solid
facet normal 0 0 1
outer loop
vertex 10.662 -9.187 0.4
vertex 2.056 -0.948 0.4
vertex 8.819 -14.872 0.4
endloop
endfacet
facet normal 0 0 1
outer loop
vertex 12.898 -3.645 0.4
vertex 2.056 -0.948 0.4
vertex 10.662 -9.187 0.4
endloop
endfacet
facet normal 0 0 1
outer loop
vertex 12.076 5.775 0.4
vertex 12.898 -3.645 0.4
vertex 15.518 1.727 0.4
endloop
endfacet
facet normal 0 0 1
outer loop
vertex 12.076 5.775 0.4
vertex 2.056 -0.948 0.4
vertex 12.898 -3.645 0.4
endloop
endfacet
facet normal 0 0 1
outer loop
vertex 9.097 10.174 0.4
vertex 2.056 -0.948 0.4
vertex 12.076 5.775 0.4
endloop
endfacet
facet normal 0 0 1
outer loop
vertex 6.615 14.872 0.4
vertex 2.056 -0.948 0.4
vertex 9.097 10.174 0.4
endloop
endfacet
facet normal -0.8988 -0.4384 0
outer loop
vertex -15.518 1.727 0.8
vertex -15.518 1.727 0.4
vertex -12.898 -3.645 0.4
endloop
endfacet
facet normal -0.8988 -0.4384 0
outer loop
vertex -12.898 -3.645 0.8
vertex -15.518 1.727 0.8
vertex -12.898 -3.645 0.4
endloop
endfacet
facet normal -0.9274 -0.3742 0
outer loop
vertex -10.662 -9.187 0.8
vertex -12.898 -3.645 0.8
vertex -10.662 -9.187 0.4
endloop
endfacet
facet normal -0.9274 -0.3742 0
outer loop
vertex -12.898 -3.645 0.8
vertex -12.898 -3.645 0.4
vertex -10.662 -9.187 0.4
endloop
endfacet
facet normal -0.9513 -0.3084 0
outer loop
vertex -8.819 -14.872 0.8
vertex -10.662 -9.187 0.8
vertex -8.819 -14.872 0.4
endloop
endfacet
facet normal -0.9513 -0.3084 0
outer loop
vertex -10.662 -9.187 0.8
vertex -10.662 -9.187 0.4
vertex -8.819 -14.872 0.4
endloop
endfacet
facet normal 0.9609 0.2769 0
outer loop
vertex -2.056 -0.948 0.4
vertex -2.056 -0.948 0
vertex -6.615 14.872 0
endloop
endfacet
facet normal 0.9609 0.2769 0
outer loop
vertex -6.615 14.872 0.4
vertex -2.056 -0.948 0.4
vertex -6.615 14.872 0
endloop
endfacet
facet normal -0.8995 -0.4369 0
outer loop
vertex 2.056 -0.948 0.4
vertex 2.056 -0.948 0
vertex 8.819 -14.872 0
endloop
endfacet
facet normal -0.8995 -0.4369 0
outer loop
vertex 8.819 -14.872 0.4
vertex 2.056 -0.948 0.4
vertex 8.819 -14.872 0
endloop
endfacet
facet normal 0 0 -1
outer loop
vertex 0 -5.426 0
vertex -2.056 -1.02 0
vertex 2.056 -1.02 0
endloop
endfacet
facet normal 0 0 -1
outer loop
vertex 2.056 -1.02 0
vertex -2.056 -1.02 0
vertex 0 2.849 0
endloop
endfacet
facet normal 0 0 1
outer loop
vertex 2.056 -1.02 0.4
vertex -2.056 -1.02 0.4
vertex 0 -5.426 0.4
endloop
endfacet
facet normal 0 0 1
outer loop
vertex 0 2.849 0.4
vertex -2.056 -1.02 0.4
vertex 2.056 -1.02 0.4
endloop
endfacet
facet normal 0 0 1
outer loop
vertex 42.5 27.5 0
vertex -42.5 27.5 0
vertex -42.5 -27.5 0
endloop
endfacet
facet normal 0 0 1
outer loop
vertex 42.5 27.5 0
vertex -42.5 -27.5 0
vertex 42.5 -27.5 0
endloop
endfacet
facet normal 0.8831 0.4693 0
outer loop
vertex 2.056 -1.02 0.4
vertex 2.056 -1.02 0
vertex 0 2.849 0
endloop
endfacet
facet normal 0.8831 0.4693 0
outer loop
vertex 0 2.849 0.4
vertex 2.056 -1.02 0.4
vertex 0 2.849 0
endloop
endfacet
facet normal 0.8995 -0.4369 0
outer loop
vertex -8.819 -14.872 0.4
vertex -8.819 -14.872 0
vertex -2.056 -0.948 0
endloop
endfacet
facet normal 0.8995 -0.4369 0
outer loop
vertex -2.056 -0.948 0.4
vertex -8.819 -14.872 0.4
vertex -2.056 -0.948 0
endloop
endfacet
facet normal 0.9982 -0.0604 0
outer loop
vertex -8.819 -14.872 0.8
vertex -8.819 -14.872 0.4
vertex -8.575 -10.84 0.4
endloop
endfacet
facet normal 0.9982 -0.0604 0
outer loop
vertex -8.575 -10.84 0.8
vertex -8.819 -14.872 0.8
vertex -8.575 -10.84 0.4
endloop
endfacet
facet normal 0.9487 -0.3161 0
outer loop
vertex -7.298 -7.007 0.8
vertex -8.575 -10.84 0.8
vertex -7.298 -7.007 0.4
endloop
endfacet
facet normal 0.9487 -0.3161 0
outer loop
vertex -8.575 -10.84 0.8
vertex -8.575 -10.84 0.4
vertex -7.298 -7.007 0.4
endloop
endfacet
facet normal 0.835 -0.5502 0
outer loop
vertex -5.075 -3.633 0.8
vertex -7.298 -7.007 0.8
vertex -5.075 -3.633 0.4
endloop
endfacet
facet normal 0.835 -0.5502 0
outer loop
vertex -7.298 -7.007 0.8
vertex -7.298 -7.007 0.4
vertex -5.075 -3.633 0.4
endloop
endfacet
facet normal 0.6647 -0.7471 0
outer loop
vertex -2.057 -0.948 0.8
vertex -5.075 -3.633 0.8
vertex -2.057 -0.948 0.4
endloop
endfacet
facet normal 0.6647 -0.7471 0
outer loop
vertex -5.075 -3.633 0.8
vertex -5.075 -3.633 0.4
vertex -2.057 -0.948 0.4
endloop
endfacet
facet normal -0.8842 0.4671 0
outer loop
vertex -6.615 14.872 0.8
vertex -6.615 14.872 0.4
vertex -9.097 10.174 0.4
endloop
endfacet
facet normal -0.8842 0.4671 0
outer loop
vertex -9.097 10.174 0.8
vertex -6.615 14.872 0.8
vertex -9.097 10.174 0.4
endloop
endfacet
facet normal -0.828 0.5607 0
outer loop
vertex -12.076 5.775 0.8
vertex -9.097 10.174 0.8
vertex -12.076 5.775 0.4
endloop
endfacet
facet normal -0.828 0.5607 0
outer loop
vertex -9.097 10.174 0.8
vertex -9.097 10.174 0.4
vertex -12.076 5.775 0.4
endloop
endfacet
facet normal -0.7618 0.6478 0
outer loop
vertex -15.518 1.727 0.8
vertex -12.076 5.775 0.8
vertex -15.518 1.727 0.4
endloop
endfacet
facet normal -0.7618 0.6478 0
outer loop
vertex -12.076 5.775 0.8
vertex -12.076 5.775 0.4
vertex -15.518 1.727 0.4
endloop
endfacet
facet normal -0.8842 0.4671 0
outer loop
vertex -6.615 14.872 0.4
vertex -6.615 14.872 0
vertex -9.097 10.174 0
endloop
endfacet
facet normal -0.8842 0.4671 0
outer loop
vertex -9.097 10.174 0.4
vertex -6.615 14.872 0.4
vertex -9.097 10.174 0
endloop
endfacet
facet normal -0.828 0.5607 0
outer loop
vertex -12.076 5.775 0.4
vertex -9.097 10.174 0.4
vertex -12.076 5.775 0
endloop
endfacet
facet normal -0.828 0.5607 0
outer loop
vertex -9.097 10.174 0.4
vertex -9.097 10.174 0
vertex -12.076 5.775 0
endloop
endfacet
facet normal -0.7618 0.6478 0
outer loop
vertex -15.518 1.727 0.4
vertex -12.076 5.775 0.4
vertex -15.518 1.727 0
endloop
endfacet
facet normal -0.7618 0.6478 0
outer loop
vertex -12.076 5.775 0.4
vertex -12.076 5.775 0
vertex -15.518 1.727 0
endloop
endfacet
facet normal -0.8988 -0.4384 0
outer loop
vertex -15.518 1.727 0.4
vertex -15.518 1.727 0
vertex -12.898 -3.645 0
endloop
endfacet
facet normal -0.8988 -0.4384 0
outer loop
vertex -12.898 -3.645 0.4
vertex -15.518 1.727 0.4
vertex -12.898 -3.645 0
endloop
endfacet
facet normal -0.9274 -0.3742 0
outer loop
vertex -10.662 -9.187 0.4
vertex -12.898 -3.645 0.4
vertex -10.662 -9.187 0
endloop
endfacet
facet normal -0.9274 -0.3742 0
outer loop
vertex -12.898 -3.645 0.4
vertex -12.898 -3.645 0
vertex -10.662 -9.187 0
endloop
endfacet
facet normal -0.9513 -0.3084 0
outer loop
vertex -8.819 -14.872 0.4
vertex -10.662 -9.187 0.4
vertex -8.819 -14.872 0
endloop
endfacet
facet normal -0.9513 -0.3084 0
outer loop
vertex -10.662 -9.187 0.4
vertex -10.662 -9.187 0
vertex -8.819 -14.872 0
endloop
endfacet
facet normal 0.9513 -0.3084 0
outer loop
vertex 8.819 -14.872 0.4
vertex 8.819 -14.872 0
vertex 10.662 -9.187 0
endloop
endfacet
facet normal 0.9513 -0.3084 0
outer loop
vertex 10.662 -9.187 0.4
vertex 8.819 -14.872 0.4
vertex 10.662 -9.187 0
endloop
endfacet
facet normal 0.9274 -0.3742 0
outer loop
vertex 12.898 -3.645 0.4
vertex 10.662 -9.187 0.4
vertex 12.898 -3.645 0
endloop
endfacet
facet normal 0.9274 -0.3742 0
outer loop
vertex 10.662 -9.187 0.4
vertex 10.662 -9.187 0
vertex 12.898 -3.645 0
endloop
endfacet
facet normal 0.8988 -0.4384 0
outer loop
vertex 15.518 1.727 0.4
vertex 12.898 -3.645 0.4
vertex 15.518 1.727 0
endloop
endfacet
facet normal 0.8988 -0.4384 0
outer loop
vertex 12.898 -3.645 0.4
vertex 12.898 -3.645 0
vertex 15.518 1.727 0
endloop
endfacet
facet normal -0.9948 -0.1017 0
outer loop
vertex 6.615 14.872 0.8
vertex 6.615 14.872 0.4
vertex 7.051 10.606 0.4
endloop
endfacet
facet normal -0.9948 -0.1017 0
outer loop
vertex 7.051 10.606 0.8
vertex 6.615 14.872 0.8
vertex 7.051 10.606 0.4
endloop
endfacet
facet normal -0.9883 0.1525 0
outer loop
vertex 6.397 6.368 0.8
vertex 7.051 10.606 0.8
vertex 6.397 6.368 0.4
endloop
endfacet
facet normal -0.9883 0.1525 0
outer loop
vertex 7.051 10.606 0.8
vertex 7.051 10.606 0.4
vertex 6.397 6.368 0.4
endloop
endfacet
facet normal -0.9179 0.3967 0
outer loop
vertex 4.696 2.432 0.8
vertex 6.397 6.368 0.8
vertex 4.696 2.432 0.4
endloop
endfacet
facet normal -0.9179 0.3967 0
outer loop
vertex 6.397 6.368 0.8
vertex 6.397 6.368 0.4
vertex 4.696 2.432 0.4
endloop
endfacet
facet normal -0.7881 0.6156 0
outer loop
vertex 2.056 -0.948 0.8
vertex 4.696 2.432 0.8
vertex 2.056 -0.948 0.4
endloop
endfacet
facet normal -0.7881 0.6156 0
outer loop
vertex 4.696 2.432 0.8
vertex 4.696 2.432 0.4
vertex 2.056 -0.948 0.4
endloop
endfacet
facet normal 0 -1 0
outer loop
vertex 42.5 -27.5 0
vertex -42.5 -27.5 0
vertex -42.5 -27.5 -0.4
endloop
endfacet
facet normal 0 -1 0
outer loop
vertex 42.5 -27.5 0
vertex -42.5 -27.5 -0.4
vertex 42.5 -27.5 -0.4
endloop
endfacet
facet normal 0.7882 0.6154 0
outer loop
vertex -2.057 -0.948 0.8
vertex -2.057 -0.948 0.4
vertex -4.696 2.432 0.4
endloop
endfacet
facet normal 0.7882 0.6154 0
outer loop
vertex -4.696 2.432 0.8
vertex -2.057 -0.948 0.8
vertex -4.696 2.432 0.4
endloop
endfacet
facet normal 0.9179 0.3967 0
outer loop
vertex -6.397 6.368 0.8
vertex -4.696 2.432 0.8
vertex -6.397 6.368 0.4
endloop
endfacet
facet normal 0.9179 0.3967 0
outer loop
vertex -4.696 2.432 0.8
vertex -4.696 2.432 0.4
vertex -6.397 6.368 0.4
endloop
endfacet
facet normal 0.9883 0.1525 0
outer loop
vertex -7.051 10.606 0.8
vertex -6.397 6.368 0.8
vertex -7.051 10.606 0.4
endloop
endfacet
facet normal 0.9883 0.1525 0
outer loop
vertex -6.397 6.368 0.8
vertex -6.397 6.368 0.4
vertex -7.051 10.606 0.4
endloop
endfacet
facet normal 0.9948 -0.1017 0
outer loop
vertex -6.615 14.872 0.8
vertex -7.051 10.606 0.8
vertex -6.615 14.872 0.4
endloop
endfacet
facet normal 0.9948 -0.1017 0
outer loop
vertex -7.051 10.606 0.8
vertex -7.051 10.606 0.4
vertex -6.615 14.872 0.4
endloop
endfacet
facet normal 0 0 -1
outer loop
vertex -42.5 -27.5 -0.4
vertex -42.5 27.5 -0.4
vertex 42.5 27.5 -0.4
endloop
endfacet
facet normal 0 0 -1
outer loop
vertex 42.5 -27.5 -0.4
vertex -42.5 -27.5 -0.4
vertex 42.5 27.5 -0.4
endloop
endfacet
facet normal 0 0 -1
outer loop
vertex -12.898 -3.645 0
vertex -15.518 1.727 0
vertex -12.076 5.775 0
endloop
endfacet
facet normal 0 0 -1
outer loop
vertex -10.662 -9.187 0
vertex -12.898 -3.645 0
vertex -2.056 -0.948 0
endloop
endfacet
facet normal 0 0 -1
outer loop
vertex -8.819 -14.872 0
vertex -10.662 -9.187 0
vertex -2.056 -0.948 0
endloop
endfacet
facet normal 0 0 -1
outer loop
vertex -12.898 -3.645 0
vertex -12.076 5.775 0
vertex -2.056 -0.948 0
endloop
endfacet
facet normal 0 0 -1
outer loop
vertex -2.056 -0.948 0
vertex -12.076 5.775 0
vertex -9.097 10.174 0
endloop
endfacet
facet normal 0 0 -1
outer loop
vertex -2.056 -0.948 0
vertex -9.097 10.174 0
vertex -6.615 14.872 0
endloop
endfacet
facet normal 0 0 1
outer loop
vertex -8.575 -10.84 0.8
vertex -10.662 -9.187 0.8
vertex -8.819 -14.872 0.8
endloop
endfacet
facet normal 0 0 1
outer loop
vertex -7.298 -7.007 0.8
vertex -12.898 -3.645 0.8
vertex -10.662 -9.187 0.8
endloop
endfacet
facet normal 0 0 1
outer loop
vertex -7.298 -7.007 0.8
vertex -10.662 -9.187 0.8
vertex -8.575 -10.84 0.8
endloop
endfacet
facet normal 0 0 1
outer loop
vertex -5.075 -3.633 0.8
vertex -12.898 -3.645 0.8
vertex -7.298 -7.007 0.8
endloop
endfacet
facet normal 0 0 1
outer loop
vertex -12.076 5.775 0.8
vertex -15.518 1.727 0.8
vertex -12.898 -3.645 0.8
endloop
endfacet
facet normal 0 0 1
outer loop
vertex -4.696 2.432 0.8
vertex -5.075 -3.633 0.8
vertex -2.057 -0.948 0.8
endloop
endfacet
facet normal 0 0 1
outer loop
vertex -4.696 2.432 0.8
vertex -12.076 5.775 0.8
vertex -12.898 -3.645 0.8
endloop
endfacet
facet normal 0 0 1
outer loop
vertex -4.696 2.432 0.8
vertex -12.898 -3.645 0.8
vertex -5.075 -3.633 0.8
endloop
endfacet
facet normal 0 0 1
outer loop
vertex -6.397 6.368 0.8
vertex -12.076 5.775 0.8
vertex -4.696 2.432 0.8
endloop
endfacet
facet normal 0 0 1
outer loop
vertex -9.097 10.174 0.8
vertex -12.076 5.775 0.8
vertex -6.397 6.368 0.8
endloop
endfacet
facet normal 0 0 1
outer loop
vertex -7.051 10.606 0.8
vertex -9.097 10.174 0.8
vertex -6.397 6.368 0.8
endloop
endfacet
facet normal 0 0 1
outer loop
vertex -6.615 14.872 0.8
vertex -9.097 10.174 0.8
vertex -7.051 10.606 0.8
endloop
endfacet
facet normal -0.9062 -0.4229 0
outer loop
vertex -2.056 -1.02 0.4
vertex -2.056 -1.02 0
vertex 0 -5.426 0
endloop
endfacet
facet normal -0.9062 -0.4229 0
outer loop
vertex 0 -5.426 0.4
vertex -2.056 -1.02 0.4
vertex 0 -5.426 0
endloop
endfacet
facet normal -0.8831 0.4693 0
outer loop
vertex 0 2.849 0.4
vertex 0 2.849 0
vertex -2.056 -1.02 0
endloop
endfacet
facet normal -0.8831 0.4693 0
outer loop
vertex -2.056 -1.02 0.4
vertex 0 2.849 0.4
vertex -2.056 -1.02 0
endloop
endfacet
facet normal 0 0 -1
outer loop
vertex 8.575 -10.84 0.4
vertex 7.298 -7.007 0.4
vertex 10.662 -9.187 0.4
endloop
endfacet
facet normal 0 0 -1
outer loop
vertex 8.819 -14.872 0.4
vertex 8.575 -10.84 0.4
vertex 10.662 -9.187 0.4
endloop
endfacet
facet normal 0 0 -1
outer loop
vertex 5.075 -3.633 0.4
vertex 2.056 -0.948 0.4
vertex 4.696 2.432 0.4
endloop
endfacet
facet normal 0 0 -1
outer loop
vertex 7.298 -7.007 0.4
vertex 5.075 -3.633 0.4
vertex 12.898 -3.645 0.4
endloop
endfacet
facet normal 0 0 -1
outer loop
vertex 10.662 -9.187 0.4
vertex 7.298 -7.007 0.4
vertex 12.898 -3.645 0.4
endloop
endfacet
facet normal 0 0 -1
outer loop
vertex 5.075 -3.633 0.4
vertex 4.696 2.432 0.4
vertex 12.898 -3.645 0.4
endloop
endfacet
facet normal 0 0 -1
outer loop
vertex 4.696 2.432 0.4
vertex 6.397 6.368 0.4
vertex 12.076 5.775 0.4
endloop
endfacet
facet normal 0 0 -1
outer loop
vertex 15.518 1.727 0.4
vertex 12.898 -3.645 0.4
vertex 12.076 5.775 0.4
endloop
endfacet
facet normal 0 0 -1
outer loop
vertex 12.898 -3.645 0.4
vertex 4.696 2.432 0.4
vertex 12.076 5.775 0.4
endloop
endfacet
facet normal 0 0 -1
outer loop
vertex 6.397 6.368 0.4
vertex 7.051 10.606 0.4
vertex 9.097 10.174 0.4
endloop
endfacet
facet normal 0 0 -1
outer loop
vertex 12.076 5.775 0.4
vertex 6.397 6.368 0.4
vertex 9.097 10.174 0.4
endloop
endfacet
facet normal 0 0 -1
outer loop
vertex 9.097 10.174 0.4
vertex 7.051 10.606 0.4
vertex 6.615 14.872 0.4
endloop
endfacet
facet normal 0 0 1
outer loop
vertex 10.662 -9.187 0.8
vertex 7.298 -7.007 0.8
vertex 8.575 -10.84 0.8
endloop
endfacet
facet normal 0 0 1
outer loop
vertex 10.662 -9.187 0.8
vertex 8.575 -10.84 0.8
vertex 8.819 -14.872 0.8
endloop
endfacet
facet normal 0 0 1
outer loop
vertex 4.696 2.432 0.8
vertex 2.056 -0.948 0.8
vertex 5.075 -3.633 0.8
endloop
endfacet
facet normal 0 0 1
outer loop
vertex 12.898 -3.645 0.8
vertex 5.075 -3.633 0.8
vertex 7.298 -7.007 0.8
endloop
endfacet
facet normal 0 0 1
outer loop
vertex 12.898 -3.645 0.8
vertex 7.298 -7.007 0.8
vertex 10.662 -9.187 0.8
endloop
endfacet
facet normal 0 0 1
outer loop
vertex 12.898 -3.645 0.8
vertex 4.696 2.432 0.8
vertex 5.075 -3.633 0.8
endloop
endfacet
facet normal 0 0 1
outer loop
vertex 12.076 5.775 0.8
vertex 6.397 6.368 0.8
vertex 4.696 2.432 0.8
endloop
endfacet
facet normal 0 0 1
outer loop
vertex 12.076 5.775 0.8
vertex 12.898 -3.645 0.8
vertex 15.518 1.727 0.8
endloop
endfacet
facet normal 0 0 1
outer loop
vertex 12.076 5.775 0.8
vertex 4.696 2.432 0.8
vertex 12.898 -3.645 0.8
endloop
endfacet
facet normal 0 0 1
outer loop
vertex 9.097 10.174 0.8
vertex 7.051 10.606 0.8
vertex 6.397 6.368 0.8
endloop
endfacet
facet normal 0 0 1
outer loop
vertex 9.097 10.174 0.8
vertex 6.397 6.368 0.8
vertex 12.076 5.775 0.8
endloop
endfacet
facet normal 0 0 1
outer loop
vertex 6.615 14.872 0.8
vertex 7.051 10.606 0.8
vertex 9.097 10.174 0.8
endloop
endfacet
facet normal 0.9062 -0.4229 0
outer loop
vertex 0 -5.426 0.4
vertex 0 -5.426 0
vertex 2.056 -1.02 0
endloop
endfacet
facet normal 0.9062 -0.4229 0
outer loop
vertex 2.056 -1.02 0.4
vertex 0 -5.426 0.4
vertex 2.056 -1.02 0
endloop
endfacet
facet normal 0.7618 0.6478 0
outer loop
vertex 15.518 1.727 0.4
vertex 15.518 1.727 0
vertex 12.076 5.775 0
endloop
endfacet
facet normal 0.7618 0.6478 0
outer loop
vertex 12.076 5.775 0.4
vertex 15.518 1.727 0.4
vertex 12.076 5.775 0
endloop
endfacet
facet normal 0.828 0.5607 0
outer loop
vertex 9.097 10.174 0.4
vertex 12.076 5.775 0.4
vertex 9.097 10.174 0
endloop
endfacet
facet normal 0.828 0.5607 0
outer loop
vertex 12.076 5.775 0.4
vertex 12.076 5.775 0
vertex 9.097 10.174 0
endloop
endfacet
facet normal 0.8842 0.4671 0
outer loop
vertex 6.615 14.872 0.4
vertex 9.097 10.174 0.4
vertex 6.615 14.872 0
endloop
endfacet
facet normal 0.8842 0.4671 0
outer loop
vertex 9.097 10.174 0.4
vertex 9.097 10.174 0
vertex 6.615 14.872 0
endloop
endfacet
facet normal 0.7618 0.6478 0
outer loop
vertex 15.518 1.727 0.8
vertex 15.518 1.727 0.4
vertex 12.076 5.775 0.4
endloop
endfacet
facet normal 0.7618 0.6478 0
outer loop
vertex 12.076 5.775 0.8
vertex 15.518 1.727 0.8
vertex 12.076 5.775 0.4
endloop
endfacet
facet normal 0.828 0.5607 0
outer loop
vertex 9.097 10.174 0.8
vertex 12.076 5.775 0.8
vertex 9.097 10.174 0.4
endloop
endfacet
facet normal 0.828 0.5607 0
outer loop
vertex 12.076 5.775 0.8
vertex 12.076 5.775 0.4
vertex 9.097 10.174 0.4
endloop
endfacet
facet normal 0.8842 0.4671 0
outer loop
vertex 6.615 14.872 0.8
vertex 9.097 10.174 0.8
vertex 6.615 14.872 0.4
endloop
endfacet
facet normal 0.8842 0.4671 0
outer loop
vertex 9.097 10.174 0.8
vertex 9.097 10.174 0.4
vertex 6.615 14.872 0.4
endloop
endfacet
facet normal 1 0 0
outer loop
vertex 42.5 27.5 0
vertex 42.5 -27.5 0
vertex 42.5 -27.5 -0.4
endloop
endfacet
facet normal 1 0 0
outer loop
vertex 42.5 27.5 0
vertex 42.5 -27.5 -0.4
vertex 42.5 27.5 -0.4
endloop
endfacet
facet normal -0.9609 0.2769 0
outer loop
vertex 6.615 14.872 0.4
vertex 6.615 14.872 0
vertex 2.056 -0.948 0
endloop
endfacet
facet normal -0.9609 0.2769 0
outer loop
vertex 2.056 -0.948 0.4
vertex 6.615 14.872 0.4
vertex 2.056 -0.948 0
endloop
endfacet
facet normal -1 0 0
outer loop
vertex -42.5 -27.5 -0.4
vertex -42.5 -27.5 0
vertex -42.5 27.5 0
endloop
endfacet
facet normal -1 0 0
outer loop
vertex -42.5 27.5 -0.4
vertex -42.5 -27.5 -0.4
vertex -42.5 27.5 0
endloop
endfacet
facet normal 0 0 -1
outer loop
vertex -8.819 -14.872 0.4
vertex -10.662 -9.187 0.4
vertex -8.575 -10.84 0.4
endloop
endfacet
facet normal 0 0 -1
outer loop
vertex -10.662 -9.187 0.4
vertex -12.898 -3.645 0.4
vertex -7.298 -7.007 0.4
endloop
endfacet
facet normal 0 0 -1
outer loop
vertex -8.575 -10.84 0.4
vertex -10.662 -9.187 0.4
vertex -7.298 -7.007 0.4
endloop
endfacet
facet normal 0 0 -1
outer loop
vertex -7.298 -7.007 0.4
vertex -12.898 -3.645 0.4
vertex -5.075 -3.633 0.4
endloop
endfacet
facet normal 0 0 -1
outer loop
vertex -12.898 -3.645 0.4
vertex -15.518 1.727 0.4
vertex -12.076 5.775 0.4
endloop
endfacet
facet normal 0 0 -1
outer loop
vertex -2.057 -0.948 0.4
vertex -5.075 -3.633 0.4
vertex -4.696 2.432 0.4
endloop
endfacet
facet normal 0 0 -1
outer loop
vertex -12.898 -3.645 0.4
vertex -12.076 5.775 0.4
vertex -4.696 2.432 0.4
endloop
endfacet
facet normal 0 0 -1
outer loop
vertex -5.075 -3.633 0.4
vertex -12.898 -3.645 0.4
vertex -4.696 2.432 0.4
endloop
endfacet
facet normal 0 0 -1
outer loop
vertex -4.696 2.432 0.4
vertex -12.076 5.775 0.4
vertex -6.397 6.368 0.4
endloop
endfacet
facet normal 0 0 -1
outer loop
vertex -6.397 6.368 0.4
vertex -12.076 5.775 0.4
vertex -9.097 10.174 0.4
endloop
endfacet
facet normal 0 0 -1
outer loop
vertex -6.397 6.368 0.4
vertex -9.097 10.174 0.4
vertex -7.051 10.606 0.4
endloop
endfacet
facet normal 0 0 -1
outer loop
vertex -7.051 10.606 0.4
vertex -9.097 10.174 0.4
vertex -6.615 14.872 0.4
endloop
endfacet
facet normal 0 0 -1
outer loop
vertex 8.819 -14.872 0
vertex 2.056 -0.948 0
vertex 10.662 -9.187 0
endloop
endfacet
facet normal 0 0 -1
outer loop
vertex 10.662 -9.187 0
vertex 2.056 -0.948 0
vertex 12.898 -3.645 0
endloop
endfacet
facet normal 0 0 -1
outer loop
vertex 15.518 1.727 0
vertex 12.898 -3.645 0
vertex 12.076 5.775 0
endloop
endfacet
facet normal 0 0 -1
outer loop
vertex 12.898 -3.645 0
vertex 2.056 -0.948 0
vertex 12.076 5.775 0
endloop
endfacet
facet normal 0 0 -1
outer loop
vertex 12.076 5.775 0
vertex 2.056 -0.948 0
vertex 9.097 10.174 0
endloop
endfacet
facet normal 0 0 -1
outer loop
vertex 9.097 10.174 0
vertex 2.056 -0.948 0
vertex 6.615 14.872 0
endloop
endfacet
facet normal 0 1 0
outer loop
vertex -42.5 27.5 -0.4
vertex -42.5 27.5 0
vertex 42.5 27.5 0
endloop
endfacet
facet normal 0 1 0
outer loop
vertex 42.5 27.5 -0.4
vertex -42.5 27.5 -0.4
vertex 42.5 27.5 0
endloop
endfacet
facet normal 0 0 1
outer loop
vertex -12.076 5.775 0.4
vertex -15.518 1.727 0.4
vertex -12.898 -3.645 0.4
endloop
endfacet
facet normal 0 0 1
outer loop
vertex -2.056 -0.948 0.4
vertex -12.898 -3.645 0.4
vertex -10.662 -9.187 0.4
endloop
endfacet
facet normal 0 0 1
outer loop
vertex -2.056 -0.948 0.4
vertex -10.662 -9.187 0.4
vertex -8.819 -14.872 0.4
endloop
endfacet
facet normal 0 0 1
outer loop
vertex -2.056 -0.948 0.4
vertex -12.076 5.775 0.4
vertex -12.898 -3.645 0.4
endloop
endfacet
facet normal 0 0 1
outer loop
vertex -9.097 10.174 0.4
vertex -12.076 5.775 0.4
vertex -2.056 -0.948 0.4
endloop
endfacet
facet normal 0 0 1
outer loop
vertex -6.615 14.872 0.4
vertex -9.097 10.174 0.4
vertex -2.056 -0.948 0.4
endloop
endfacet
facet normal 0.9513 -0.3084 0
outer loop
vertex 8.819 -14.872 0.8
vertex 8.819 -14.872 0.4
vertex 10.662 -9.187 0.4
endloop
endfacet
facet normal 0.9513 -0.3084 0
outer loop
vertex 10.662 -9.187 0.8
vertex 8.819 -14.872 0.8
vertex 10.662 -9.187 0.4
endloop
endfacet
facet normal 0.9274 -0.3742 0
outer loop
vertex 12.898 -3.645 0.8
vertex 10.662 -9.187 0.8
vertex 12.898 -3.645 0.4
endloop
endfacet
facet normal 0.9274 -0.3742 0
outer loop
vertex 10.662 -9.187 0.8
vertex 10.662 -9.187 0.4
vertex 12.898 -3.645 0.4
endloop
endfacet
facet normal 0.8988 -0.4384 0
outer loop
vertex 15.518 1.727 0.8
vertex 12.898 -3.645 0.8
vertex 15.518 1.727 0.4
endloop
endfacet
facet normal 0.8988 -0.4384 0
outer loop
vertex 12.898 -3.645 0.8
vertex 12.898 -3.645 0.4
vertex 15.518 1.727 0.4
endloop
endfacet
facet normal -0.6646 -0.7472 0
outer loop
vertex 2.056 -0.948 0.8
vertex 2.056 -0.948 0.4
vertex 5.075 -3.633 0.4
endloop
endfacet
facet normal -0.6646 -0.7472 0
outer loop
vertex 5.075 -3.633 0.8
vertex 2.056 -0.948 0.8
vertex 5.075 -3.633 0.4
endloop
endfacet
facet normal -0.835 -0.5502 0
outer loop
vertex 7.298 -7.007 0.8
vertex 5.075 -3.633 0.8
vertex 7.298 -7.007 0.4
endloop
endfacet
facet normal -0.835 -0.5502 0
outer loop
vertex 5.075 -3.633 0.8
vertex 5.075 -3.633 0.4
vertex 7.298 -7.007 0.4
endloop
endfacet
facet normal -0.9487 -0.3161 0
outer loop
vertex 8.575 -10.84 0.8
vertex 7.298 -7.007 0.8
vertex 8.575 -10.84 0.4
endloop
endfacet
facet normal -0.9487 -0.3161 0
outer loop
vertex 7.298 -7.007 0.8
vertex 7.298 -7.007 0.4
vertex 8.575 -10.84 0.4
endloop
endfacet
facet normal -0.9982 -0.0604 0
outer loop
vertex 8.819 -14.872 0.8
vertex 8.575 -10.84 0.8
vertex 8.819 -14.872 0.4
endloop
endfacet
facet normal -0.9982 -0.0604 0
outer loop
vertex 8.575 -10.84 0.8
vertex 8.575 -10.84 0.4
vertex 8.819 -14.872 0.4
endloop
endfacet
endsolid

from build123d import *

# Parameters (mm, degrees)
F1_DEPTH = 0.4
F2_W     = 85
F2_H     = 55
F3_DEPTH = 0.4
F5_DEPTH = 0.4


with BuildPart() as f1:
    # F0 (on Top) → F1 (new body)
    with BuildSketch(Plane.XY):
        Polygon((-2.0565, -1.019582), (0, -5.426367), (2.0565, -1.019582), (0, 2.848596), align=None)
        with BuildLine():
            ThreePointArc((15.517817, 1.726592), (10.526359, 7.933479), (6.615495, 14.872156))
            Line((6.615495, 14.872156), (2.0565, -0.948094))
            Line((2.0565, -0.948094), (8.818777, -14.872156))
            ThreePointArc((8.818777, -14.872156), (11.731548, -6.396516), (15.517817, 1.726592))
        make_face()
        with BuildLine():
            Line((-2.0565, -0.948094), (-6.615495, 14.872156))
            ThreePointArc((-6.615495, 14.872156), (-10.526359, 7.933479), (-15.517817, 1.726592))
            ThreePointArc((-15.517817, 1.726592), (-11.731548, -6.396516), (-8.818777, -14.872156))
            Line((-8.818777, -14.872156), (-2.0565, -0.948094))
        make_face()
    extrude(amount=F1_DEPTH)


with BuildPart() as f3:
    # F2 (on Top) → F3 (new body)
    with BuildSketch(Plane.XY):
        Rectangle(F2_W, F2_H)
    extrude(amount=-F3_DEPTH)


with BuildPart() as f5:
    # F4 (on face) → F5 (new body)
    with BuildSketch(Plane.XY.offset(0.4)):
        with BuildLine():
            ThreePointArc((-8.818777, -14.872156), (-7.297963, -7.006651), (-2.0565, -0.948094))
            ThreePointArc((-2.0565, -0.948094), (-6.397488, 6.367962), (-6.615495, 14.872156))
            ThreePointArc((-6.615495, 14.872156), (-10.526359, 7.933479), (-15.517817, 1.726592))
            ThreePointArc((-15.517817, 1.726592), (-11.731548, -6.396516), (-8.818777, -14.872156))
        make_face()
        with BuildLine():
            ThreePointArc((6.615495, 14.872156), (6.397488, 6.367962), (2.0565, -0.948094))
            ThreePointArc((2.0565, -0.948094), (7.297963, -7.006651), (8.818777, -14.872156))
            ThreePointArc((8.818777, -14.872156), (11.731548, -6.396516), (15.517817, 1.726592))
            ThreePointArc((15.517817, 1.726592), (10.526359, 7.933479), (6.615495, 14.872156))
        make_face()
    extrude(amount=F5_DEPTH)


solid = Compound([f1.part, f3.part, f5.part])
